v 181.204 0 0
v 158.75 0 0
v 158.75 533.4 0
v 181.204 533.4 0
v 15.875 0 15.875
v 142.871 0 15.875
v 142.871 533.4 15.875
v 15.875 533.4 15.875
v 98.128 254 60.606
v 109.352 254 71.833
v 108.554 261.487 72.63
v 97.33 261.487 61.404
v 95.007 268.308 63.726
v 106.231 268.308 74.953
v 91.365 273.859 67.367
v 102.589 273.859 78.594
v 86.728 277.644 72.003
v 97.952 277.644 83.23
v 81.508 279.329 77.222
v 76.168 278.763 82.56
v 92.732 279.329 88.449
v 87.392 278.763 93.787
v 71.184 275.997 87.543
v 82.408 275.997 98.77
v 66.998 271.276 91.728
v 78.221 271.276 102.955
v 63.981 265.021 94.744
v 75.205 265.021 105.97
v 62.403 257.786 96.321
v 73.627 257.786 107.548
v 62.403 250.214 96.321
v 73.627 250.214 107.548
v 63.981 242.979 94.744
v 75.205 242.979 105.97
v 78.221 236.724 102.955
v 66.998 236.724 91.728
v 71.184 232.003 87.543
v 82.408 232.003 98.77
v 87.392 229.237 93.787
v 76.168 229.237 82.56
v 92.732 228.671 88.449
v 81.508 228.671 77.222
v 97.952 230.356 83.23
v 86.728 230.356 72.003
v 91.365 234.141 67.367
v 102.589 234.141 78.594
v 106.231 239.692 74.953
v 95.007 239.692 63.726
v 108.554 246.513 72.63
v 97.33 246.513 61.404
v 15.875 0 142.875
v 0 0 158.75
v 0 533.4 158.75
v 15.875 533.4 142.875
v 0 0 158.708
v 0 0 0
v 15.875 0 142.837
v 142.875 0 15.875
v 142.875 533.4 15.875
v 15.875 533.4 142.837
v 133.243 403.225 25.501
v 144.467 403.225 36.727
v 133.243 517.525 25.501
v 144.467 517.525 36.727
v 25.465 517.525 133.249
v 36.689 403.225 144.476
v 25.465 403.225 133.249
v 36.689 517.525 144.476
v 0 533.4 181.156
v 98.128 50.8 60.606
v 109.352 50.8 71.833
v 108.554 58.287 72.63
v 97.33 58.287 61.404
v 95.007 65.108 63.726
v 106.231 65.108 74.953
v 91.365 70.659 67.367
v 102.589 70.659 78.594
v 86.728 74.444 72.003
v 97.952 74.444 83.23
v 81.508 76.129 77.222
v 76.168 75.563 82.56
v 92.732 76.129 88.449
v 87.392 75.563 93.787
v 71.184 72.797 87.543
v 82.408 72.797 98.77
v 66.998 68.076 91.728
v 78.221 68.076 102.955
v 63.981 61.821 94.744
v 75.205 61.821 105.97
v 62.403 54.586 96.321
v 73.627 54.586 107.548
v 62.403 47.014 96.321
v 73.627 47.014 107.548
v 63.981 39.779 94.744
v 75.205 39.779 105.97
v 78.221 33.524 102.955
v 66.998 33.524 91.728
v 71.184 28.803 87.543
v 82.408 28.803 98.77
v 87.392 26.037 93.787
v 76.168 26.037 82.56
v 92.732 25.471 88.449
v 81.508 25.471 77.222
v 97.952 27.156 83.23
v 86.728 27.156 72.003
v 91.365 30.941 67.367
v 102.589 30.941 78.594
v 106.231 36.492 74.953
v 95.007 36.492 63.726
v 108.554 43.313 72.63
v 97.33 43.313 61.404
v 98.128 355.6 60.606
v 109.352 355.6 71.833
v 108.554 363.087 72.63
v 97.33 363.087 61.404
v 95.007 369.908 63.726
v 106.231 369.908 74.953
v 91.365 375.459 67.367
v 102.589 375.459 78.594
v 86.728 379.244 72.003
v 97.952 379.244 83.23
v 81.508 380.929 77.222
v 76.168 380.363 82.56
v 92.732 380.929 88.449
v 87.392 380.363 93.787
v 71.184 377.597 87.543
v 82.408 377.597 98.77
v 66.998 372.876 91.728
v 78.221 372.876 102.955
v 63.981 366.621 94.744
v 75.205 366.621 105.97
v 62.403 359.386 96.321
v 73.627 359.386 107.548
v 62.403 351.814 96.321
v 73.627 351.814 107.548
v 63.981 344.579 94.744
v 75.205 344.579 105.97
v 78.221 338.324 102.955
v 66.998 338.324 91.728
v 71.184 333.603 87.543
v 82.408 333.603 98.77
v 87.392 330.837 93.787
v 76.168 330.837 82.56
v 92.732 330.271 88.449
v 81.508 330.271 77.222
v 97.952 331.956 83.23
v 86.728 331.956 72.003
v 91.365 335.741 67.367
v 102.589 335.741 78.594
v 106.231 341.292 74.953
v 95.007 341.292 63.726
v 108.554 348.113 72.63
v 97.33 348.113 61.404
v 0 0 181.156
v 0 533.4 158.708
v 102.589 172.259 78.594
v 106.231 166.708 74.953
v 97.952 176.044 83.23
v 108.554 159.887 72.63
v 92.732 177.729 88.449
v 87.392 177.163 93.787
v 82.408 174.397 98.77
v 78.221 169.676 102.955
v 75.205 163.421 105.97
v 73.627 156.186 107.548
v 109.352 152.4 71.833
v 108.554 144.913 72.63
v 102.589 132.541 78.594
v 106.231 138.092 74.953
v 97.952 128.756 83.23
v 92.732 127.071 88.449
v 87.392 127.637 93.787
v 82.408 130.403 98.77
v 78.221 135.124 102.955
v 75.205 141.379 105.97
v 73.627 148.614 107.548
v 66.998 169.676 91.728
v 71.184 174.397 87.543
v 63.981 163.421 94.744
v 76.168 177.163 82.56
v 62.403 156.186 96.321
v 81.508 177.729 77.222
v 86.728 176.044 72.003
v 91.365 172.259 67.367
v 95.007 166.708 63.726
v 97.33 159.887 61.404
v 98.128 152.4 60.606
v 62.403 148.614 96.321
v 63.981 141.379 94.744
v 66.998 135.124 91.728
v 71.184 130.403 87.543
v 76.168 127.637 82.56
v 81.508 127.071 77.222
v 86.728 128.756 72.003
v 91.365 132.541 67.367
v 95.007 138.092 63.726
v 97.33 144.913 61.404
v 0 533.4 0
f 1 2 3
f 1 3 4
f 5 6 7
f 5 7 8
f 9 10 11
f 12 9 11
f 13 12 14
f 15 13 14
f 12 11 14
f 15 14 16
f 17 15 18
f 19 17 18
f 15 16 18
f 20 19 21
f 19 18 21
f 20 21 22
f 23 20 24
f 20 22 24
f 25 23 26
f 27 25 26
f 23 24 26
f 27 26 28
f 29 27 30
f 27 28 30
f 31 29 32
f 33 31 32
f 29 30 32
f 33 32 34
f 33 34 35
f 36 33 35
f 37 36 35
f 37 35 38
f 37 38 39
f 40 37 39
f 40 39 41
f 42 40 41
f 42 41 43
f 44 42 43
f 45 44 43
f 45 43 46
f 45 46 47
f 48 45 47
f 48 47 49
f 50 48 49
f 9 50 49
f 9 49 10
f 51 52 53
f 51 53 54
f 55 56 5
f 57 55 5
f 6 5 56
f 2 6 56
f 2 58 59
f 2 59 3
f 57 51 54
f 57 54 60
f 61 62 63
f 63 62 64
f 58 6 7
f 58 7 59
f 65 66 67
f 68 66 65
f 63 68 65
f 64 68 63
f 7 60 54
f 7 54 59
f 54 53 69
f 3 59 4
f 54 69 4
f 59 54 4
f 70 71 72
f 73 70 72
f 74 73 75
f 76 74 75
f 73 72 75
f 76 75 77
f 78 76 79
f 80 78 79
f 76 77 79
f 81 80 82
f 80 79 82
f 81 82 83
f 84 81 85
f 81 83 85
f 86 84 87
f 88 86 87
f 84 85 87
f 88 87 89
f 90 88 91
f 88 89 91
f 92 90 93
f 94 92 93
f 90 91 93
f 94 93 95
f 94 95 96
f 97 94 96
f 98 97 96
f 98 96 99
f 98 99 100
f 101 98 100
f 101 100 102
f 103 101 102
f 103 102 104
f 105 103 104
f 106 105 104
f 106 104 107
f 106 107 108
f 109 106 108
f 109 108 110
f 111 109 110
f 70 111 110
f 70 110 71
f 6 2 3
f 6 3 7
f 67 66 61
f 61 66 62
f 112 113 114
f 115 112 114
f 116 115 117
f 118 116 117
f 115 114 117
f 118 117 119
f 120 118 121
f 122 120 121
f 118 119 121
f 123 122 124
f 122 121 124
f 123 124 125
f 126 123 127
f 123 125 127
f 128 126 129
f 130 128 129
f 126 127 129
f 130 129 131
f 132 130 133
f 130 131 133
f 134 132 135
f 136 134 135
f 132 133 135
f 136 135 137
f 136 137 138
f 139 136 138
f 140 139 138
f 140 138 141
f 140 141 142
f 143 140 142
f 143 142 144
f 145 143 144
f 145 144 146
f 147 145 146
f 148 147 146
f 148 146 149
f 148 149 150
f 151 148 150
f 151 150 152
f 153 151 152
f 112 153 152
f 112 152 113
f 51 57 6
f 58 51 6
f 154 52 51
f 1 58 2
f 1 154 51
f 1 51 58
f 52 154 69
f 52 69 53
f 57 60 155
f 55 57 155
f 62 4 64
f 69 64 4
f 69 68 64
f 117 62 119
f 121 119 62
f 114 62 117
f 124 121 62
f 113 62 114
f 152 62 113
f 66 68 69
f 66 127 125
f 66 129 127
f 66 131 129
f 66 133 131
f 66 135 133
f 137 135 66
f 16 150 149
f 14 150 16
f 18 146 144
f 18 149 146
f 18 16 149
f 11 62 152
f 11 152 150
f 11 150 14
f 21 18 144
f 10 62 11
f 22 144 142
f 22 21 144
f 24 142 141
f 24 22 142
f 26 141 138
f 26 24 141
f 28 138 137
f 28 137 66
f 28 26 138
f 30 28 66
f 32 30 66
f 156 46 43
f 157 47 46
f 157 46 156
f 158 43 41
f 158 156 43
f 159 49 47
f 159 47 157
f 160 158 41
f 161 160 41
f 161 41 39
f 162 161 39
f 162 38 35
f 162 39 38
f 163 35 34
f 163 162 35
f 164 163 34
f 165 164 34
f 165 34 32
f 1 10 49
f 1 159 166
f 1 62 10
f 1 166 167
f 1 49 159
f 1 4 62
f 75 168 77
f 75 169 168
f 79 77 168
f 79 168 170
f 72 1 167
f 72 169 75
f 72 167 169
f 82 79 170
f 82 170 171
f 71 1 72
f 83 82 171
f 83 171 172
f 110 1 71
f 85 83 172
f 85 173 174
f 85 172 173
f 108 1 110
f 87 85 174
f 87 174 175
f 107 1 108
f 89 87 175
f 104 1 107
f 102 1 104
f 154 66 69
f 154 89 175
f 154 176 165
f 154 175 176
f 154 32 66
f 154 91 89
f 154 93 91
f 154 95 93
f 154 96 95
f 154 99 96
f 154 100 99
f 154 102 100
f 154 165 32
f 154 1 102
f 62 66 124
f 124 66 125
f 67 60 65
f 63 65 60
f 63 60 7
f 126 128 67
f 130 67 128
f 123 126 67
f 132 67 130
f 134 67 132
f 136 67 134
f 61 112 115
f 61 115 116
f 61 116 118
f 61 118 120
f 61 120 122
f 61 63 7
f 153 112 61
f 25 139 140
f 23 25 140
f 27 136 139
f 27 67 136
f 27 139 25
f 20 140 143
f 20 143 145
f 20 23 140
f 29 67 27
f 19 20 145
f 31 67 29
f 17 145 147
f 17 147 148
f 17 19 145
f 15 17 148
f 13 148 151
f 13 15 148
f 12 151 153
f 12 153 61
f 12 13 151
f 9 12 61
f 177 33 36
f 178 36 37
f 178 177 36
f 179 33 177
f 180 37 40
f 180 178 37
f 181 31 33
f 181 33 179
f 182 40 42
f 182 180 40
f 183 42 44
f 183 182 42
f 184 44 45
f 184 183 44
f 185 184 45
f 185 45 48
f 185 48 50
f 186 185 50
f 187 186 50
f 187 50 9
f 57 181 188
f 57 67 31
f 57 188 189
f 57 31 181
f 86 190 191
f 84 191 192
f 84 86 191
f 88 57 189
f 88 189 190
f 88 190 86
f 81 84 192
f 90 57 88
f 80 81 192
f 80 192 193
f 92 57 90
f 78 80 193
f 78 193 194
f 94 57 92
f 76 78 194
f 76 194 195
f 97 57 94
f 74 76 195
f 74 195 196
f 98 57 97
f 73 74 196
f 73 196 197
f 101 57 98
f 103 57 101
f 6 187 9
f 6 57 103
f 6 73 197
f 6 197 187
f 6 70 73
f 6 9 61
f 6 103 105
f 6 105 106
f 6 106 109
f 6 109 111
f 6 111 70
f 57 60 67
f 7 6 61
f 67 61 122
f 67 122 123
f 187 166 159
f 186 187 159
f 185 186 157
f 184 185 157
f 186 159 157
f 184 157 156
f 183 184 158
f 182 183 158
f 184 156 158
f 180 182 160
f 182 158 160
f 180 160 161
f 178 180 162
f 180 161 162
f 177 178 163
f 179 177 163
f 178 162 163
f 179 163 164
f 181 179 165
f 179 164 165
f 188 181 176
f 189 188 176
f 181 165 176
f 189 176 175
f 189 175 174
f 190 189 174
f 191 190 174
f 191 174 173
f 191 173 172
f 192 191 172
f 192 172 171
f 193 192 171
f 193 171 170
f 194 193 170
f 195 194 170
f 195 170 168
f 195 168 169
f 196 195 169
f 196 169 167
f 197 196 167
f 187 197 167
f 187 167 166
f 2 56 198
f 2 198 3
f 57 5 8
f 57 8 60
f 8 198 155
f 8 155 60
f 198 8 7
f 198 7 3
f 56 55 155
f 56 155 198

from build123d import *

# Parameters (mm, degrees)
F1_DEPTH = 533.4
F3_R     = 25.4
F3_W     = 152.4
F3_H     = 114.3
F4_DEPTH = 17.78


# Not quite as in the source:
# - a feature names something its author has since deleted; it is built from what else it names


with BuildPart() as f1:
    # F0 (on Front) → F1 (new body)
    with BuildSketch(Plane.XZ):
        Polygon((0, 158.7081573489), (0, 0), (158.75, 0), (142.8708146317, 15.875), (15.875, 15.875), (15.875, 142.837341614), align=None)
    extrude(amount=-F1_DEPTH)


with BuildPart() as f1b:
    # F0 (on Front) → F1, piece 2 (new body)
    with BuildSketch(Plane.XZ):
        Polygon((142.875, 15.875), (158.75, 0), (181.2036, 0), (0, 181.1558391243), (0, 158.75), (15.875, 142.875), (15.875, 142.837341614), (142.8708146317, 15.875), align=None)
    extrude(amount=-F1_DEPTH)

    # F3 (on face) → F4 (cut)
    with BuildSketch(Plane(origin=(90.577916415, 0, 90.601796852), x_dir=(0.7071999754, 0, -0.7070135747), z_dir=(0.7070135747, 0, 0.7071999754))):
        with Locations((1.1471814675, 50.8)):
            Circle(F3_R)
        with Locations((1.1471814675, 152.4)):
            Circle(F3_R)
        with Locations((1.1471814675, 254)):
            Circle(F3_R)
        with Locations((1.1471814675, 355.6)):
            Circle(F3_R)
        with Locations((0, 460.375)):
            Rectangle(F3_W, F3_H)
    extrude(amount=-F4_DEPTH, mode=Mode.SUBTRACT)


solid = Compound([f1.part, f1b.part])
